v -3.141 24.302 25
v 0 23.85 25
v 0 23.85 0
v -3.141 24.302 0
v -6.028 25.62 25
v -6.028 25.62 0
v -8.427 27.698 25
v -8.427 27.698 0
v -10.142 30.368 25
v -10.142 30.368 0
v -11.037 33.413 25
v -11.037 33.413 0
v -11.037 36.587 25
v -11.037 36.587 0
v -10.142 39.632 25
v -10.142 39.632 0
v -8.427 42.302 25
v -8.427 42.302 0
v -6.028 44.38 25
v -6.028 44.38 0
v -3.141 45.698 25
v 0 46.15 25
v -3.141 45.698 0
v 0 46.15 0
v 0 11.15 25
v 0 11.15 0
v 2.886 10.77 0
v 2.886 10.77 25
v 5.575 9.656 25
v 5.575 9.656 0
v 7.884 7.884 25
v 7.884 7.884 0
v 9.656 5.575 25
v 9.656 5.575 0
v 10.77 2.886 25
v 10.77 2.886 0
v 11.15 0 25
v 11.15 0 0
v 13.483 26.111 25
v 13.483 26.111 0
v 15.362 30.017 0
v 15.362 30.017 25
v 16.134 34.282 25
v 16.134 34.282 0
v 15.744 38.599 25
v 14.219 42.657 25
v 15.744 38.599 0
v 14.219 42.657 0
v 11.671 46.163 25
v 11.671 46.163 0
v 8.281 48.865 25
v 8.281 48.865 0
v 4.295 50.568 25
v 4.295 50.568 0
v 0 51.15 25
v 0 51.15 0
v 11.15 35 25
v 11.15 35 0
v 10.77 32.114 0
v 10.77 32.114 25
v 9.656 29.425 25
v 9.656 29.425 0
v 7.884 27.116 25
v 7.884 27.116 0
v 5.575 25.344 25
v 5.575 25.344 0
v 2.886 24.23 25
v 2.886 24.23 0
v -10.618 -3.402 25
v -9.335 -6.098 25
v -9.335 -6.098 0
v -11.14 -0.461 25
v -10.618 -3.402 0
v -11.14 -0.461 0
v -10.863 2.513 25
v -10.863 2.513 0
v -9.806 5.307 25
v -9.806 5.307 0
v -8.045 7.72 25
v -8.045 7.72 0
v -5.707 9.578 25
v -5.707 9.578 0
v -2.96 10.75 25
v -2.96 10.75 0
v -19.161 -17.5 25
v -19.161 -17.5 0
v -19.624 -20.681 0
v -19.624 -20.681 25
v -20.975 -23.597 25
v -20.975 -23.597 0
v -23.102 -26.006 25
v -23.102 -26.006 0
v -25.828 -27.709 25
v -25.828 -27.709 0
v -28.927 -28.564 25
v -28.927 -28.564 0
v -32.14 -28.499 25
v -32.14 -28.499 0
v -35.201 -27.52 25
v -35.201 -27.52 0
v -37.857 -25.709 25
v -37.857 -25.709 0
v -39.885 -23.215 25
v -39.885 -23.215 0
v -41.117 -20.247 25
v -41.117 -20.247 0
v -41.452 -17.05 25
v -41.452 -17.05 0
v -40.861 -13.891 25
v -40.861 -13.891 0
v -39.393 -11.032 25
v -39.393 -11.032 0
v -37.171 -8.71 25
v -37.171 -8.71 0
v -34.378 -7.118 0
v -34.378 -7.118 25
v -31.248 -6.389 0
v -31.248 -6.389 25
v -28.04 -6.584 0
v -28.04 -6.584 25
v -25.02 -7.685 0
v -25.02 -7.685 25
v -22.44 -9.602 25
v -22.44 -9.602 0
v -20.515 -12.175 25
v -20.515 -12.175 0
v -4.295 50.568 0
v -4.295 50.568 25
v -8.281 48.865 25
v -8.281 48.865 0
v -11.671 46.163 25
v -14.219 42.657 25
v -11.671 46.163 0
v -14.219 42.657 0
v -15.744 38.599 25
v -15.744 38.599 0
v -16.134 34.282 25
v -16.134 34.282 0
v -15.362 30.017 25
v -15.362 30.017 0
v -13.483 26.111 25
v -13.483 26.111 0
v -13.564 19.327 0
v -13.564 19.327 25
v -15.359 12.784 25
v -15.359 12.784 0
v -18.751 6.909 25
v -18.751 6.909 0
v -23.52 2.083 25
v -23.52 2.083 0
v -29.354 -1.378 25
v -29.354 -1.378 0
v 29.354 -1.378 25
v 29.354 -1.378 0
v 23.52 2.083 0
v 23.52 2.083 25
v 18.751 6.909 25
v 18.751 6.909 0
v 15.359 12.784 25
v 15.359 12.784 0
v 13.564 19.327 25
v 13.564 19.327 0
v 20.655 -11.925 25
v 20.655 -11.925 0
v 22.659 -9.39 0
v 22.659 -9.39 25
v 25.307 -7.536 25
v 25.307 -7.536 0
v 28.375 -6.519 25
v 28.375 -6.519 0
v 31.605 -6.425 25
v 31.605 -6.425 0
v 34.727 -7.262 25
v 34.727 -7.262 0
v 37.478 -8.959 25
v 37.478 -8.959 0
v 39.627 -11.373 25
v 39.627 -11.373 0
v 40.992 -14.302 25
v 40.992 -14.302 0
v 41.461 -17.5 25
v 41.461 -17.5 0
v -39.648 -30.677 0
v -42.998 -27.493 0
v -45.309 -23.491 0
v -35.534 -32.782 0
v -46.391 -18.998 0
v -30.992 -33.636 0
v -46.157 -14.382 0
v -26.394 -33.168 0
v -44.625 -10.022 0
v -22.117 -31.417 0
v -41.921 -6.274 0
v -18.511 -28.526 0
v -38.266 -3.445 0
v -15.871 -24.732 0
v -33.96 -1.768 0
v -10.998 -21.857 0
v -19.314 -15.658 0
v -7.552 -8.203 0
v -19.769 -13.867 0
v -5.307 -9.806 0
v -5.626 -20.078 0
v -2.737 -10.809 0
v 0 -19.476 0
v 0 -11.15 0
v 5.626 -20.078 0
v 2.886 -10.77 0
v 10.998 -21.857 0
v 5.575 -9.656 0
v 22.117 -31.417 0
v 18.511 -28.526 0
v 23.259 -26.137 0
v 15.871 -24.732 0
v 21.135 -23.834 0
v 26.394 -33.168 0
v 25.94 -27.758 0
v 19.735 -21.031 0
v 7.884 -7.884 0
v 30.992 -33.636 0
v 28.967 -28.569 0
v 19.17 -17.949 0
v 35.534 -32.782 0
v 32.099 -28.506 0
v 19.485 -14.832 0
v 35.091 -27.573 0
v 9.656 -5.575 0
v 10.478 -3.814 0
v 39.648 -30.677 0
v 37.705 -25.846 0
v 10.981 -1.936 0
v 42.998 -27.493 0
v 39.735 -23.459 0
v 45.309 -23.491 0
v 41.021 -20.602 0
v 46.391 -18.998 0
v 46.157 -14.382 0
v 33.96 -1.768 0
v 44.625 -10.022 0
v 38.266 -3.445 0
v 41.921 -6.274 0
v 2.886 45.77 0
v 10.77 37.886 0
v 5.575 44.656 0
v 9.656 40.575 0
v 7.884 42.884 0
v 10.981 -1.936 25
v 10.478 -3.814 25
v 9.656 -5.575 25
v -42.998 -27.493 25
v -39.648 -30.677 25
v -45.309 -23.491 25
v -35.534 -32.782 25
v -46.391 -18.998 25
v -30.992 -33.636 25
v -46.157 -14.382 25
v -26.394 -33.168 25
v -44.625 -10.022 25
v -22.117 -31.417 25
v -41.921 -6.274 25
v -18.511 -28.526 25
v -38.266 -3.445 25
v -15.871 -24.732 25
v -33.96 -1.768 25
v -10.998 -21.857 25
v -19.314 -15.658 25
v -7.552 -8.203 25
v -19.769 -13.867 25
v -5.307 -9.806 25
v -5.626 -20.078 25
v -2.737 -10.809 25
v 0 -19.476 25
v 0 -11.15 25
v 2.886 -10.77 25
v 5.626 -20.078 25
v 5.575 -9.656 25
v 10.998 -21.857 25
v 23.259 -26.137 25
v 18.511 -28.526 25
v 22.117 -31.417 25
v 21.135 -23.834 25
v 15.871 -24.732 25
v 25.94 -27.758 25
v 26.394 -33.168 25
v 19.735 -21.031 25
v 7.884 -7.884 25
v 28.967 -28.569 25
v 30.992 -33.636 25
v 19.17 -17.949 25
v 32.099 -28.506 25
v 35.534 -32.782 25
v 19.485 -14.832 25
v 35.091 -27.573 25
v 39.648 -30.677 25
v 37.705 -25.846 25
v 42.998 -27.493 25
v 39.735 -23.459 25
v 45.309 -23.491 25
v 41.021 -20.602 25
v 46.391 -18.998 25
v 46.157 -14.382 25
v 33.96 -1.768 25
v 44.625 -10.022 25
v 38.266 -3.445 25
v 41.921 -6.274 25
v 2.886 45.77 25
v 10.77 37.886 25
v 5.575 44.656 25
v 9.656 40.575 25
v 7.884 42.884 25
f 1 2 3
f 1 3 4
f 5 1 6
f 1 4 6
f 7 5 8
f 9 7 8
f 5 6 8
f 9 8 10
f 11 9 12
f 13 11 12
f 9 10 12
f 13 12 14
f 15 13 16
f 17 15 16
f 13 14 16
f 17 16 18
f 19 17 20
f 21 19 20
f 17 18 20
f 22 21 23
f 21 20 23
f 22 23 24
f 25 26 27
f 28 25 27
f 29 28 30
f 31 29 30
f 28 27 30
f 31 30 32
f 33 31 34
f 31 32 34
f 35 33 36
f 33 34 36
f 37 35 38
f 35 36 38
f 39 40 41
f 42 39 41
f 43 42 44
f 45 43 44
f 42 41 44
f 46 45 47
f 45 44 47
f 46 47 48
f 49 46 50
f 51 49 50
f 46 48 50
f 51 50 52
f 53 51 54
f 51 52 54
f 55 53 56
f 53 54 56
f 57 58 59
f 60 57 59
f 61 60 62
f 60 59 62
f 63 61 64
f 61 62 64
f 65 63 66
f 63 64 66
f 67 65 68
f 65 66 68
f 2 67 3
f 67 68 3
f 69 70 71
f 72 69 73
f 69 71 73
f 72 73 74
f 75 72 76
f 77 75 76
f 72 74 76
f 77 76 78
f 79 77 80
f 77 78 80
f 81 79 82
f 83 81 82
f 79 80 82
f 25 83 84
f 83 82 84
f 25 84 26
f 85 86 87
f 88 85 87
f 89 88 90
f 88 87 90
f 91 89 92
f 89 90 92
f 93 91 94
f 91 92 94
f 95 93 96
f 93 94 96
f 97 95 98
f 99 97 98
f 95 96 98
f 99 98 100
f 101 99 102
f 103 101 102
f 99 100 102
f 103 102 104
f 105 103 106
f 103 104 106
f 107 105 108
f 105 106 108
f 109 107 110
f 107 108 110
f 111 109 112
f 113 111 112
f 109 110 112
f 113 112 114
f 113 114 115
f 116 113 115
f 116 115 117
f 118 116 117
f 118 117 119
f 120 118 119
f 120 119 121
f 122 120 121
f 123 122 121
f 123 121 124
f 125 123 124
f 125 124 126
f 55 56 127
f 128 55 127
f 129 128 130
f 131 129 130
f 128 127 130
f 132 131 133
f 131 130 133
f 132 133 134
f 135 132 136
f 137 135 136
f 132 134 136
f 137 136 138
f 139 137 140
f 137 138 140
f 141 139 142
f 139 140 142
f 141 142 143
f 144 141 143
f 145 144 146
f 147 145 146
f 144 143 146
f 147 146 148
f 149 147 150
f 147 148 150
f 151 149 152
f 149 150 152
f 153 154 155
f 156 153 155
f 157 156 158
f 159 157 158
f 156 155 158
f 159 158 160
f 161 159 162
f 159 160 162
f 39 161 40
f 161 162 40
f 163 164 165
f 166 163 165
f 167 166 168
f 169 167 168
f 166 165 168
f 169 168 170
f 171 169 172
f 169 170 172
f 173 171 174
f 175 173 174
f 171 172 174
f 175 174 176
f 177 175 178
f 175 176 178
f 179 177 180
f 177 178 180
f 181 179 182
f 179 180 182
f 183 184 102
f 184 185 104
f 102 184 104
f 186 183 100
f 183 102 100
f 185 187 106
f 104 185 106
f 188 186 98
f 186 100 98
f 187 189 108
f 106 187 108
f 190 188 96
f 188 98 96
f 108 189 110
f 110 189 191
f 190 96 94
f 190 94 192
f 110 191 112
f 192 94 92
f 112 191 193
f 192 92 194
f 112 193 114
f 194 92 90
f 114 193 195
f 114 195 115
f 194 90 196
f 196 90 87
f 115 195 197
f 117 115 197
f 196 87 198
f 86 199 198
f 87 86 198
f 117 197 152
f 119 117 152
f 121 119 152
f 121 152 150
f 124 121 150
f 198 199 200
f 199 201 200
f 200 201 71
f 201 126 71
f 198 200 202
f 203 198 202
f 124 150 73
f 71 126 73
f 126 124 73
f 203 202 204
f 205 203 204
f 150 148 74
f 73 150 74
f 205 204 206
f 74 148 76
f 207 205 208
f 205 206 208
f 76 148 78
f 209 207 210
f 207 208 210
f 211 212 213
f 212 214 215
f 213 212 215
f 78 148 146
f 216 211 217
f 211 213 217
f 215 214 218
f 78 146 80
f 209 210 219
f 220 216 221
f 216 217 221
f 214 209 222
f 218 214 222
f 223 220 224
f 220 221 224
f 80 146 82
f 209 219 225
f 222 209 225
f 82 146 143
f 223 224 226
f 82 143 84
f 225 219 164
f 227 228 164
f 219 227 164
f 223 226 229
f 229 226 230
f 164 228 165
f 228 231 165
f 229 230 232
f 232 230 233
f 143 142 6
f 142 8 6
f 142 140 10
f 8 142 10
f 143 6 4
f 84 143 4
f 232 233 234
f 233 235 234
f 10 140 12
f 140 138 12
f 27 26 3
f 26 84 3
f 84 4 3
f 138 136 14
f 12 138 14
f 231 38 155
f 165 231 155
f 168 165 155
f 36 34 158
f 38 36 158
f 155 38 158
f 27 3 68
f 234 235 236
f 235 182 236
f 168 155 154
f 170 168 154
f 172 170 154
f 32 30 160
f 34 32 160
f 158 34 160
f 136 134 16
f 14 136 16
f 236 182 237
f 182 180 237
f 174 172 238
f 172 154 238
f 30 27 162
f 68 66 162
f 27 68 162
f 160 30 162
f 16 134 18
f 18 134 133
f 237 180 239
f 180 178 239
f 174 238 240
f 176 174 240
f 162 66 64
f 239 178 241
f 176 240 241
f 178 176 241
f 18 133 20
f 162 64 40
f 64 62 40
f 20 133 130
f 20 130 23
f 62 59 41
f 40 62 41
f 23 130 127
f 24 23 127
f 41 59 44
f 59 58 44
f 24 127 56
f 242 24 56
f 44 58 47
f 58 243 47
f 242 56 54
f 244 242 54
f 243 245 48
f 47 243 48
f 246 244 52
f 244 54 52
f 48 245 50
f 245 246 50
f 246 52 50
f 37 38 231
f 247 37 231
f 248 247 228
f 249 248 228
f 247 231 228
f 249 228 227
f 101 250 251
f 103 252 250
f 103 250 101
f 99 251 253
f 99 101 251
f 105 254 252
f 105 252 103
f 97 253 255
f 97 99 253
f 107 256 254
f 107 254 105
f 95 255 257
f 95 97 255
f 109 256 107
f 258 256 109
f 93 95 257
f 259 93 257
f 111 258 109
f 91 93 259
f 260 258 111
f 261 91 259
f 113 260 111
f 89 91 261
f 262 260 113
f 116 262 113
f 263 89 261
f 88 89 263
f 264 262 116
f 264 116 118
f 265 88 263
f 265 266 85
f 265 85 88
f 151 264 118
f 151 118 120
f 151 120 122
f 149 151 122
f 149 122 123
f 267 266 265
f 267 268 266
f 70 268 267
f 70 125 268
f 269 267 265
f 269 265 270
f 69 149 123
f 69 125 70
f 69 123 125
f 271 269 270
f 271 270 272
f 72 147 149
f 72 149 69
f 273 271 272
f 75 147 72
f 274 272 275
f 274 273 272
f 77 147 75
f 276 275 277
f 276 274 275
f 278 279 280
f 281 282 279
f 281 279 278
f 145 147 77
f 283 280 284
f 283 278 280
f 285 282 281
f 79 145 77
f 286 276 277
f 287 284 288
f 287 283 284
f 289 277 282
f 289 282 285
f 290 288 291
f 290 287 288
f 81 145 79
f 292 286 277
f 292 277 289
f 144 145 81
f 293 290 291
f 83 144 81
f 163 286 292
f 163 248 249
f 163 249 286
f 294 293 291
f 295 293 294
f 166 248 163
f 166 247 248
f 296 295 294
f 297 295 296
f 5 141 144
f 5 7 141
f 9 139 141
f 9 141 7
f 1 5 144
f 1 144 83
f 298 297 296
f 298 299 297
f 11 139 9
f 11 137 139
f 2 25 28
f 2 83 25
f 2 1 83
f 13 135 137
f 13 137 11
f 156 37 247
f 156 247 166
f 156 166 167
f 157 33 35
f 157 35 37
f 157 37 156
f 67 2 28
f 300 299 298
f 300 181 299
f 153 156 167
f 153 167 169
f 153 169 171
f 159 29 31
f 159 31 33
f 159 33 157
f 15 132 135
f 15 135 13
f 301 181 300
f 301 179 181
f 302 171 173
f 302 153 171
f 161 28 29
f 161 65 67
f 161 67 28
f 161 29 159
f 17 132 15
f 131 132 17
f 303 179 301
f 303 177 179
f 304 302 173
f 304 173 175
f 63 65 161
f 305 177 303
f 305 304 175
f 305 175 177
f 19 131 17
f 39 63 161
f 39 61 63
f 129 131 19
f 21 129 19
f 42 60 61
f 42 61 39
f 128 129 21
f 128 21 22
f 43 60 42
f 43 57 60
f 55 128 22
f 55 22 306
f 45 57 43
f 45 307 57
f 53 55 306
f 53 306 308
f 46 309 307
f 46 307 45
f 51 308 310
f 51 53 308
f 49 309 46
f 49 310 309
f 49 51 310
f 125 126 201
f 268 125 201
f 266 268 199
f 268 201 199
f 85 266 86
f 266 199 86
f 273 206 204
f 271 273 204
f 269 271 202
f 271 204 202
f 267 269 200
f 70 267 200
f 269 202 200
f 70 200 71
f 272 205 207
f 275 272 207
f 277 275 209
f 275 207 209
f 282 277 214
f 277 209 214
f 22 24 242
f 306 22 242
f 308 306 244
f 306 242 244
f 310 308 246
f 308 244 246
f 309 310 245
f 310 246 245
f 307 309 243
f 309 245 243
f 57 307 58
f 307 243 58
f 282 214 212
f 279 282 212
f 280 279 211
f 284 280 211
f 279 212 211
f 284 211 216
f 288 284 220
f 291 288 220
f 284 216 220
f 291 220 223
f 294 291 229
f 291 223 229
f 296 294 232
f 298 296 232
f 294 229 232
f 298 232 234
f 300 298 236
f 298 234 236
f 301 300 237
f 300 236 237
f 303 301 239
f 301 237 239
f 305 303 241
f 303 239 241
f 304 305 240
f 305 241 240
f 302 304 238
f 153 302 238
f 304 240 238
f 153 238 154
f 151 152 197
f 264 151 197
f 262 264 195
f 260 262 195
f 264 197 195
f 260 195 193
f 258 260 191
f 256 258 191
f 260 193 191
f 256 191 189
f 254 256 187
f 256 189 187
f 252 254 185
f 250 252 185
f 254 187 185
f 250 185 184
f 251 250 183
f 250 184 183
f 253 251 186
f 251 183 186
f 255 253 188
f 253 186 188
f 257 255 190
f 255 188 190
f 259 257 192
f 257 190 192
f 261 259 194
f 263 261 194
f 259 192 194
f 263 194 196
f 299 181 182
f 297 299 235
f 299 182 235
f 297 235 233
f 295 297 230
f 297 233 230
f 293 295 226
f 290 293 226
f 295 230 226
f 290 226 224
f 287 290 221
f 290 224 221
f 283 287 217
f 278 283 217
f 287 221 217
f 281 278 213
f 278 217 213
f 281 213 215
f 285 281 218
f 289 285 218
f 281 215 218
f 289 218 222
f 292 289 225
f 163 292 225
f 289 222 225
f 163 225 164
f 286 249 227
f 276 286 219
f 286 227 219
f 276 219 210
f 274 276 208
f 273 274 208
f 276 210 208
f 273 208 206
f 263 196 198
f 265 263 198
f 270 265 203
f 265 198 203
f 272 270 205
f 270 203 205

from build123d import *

# Parameters (mm, degrees)
F1_DEPTH = 7
F2_DEPTH = 25


with BuildPart() as f1:
    # F0 (on Top) → F1 (new body)
    with BuildSketch(Plane.XY):
        with BuildLine():
            ThreePointArc((41.460889, -17.5), (33.196721, -6.729927), (20.654706, -11.925))
            ThreePointArc((20.654706, -11.925), (27.425057, -28.270073), (41.460889, -17.5))
        make_face()
        with BuildLine():
            ThreePointArc((0, 11.15), (7.884241, 7.884241), (11.15, 0))
            ThreePointArc((11.15, 0), (10.770073, -2.885832), (9.656183, -5.575))
            ThreePointArc((9.656183, -5.575), (5.575, -9.656183), (0, -11.15))
            Line((0, -11.15), (0, -19.476393))
            ThreePointArc((0, -19.476393), (8.359284, -20.824585), (15.870867, -24.732445))
            ThreePointArc((15.870867, -24.732445), (44.297199, -25.575), (29.354359, -1.378351))
            ThreePointArc((29.354359, -1.378351), (16.867051, 9.738196), (13.483492, 26.110797))
            ThreePointArc((13.483492, 26.110797), (14.219408, 42.657084), (0, 51.15))
            Line((0, 51.15), (0, 46.15))
            ThreePointArc((0, 46.15), (7.884241, 42.884241), (11.15, 35))
            ThreePointArc((11.15, 35), (7.884241, 27.115759), (0, 23.85))
            Line((0, 23.85), (0, 11.15))
        make_face()
        with BuildLine():
            ThreePointArc((41.460889, -17.5), (27.425057, -28.270073), (20.654706, -11.925))
            ThreePointArc((20.654706, -11.925), (33.196721, -6.729927), (41.460889, -17.5))
        make_face(mode=Mode.SUBTRACT)
        with BuildLine():
            ThreePointArc((-19.160889, -17.5), (-19.504592, -14.752919), (-20.514513, -12.175198))
            ThreePointArc((-20.514513, -12.175198), (-41.117186, -20.247081), (-19.160889, -17.5))
        make_face()
        with BuildLine():
            ThreePointArc((-9.334502, -6.098325), (-9.80609, 5.306891), (0, 11.15))
            Line((0, 11.15), (0, 23.85))
            ThreePointArc((0, 23.85), (-11.15, 35), (0, 46.15))
            Line((0, 46.15), (0, 51.15))
            ThreePointArc((0, 51.15), (-14.219408, 42.657084), (-13.483492, 26.110797))
            ThreePointArc((-13.483492, 26.110797), (-16.867051, 9.738196), (-29.354359, -1.378351))
            ThreePointArc((-29.354359, -1.378351), (-44.297199, -25.575), (-15.870867, -24.732445))
            ThreePointArc((-15.870867, -24.732445), (-8.359284, -20.824585), (0, -19.476393))
            Line((0, -19.476393), (0, -11.15))
            ThreePointArc((0, -11.15), (-5.306891, -9.80609), (-9.334502, -6.098325))
        make_face()
        with BuildLine():
            ThreePointArc((-19.160889, -17.5), (-41.117186, -20.247081), (-20.514513, -12.175198))
            ThreePointArc((-20.514513, -12.175198), (-19.504592, -14.752919), (-19.160889, -17.5))
        make_face(mode=Mode.SUBTRACT)
    extrude(amount=F1_DEPTH)

    # F0 (on Top) → F2 (join)
    with BuildSketch(Plane.XY):
        with BuildLine():
            ThreePointArc((41.460889, -17.5), (33.196721, -6.729927), (20.654706, -11.925))
            ThreePointArc((20.654706, -11.925), (27.425057, -28.270073), (41.460889, -17.5))
        make_face()
        with BuildLine():
            ThreePointArc((0, 11.15), (7.884241, 7.884241), (11.15, 0))
            ThreePointArc((11.15, 0), (10.770073, -2.885832), (9.656183, -5.575))
            ThreePointArc((9.656183, -5.575), (5.575, -9.656183), (0, -11.15))
            Line((0, -11.15), (0, -19.476393))
            ThreePointArc((0, -19.476393), (8.359284, -20.824585), (15.870867, -24.732445))
            ThreePointArc((15.870867, -24.732445), (44.297199, -25.575), (29.354359, -1.378351))
            ThreePointArc((29.354359, -1.378351), (16.867051, 9.738196), (13.483492, 26.110797))
            ThreePointArc((13.483492, 26.110797), (14.219408, 42.657084), (0, 51.15))
            Line((0, 51.15), (0, 46.15))
            ThreePointArc((0, 46.15), (7.884241, 42.884241), (11.15, 35))
            ThreePointArc((11.15, 35), (7.884241, 27.115759), (0, 23.85))
            Line((0, 23.85), (0, 11.15))
        make_face()
        with BuildLine():
            ThreePointArc((41.460889, -17.5), (27.425057, -28.270073), (20.654706, -11.925))
            ThreePointArc((20.654706, -11.925), (33.196721, -6.729927), (41.460889, -17.5))
        make_face(mode=Mode.SUBTRACT)
        with BuildLine():
            ThreePointArc((-19.160889, -17.5), (-19.504592, -14.752919), (-20.514513, -12.175198))
            ThreePointArc((-20.514513, -12.175198), (-41.117186, -20.247081), (-19.160889, -17.5))
        make_face()
        with BuildLine():
            ThreePointArc((-9.334502, -6.098325), (-9.80609, 5.306891), (0, 11.15))
            Line((0, 11.15), (0, 23.85))
            ThreePointArc((0, 23.85), (-11.15, 35), (0, 46.15))
            Line((0, 46.15), (0, 51.15))
            ThreePointArc((0, 51.15), (-14.219408, 42.657084), (-13.483492, 26.110797))
            ThreePointArc((-13.483492, 26.110797), (-16.867051, 9.738196), (-29.354359, -1.378351))
            ThreePointArc((-29.354359, -1.378351), (-44.297199, -25.575), (-15.870867, -24.732445))
            ThreePointArc((-15.870867, -24.732445), (-8.359284, -20.824585), (0, -19.476393))
            Line((0, -19.476393), (0, -11.15))
            ThreePointArc((0, -11.15), (-5.306891, -9.80609), (-9.334502, -6.098325))
        make_face()
        with BuildLine():
            ThreePointArc((-19.160889, -17.5), (-41.117186, -20.247081), (-20.514513, -12.175198))
            ThreePointArc((-20.514513, -12.175198), (-19.504592, -14.752919), (-19.160889, -17.5))
        make_face(mode=Mode.SUBTRACT)
    extrude(amount=F2_DEPTH)


solid = f1.part
